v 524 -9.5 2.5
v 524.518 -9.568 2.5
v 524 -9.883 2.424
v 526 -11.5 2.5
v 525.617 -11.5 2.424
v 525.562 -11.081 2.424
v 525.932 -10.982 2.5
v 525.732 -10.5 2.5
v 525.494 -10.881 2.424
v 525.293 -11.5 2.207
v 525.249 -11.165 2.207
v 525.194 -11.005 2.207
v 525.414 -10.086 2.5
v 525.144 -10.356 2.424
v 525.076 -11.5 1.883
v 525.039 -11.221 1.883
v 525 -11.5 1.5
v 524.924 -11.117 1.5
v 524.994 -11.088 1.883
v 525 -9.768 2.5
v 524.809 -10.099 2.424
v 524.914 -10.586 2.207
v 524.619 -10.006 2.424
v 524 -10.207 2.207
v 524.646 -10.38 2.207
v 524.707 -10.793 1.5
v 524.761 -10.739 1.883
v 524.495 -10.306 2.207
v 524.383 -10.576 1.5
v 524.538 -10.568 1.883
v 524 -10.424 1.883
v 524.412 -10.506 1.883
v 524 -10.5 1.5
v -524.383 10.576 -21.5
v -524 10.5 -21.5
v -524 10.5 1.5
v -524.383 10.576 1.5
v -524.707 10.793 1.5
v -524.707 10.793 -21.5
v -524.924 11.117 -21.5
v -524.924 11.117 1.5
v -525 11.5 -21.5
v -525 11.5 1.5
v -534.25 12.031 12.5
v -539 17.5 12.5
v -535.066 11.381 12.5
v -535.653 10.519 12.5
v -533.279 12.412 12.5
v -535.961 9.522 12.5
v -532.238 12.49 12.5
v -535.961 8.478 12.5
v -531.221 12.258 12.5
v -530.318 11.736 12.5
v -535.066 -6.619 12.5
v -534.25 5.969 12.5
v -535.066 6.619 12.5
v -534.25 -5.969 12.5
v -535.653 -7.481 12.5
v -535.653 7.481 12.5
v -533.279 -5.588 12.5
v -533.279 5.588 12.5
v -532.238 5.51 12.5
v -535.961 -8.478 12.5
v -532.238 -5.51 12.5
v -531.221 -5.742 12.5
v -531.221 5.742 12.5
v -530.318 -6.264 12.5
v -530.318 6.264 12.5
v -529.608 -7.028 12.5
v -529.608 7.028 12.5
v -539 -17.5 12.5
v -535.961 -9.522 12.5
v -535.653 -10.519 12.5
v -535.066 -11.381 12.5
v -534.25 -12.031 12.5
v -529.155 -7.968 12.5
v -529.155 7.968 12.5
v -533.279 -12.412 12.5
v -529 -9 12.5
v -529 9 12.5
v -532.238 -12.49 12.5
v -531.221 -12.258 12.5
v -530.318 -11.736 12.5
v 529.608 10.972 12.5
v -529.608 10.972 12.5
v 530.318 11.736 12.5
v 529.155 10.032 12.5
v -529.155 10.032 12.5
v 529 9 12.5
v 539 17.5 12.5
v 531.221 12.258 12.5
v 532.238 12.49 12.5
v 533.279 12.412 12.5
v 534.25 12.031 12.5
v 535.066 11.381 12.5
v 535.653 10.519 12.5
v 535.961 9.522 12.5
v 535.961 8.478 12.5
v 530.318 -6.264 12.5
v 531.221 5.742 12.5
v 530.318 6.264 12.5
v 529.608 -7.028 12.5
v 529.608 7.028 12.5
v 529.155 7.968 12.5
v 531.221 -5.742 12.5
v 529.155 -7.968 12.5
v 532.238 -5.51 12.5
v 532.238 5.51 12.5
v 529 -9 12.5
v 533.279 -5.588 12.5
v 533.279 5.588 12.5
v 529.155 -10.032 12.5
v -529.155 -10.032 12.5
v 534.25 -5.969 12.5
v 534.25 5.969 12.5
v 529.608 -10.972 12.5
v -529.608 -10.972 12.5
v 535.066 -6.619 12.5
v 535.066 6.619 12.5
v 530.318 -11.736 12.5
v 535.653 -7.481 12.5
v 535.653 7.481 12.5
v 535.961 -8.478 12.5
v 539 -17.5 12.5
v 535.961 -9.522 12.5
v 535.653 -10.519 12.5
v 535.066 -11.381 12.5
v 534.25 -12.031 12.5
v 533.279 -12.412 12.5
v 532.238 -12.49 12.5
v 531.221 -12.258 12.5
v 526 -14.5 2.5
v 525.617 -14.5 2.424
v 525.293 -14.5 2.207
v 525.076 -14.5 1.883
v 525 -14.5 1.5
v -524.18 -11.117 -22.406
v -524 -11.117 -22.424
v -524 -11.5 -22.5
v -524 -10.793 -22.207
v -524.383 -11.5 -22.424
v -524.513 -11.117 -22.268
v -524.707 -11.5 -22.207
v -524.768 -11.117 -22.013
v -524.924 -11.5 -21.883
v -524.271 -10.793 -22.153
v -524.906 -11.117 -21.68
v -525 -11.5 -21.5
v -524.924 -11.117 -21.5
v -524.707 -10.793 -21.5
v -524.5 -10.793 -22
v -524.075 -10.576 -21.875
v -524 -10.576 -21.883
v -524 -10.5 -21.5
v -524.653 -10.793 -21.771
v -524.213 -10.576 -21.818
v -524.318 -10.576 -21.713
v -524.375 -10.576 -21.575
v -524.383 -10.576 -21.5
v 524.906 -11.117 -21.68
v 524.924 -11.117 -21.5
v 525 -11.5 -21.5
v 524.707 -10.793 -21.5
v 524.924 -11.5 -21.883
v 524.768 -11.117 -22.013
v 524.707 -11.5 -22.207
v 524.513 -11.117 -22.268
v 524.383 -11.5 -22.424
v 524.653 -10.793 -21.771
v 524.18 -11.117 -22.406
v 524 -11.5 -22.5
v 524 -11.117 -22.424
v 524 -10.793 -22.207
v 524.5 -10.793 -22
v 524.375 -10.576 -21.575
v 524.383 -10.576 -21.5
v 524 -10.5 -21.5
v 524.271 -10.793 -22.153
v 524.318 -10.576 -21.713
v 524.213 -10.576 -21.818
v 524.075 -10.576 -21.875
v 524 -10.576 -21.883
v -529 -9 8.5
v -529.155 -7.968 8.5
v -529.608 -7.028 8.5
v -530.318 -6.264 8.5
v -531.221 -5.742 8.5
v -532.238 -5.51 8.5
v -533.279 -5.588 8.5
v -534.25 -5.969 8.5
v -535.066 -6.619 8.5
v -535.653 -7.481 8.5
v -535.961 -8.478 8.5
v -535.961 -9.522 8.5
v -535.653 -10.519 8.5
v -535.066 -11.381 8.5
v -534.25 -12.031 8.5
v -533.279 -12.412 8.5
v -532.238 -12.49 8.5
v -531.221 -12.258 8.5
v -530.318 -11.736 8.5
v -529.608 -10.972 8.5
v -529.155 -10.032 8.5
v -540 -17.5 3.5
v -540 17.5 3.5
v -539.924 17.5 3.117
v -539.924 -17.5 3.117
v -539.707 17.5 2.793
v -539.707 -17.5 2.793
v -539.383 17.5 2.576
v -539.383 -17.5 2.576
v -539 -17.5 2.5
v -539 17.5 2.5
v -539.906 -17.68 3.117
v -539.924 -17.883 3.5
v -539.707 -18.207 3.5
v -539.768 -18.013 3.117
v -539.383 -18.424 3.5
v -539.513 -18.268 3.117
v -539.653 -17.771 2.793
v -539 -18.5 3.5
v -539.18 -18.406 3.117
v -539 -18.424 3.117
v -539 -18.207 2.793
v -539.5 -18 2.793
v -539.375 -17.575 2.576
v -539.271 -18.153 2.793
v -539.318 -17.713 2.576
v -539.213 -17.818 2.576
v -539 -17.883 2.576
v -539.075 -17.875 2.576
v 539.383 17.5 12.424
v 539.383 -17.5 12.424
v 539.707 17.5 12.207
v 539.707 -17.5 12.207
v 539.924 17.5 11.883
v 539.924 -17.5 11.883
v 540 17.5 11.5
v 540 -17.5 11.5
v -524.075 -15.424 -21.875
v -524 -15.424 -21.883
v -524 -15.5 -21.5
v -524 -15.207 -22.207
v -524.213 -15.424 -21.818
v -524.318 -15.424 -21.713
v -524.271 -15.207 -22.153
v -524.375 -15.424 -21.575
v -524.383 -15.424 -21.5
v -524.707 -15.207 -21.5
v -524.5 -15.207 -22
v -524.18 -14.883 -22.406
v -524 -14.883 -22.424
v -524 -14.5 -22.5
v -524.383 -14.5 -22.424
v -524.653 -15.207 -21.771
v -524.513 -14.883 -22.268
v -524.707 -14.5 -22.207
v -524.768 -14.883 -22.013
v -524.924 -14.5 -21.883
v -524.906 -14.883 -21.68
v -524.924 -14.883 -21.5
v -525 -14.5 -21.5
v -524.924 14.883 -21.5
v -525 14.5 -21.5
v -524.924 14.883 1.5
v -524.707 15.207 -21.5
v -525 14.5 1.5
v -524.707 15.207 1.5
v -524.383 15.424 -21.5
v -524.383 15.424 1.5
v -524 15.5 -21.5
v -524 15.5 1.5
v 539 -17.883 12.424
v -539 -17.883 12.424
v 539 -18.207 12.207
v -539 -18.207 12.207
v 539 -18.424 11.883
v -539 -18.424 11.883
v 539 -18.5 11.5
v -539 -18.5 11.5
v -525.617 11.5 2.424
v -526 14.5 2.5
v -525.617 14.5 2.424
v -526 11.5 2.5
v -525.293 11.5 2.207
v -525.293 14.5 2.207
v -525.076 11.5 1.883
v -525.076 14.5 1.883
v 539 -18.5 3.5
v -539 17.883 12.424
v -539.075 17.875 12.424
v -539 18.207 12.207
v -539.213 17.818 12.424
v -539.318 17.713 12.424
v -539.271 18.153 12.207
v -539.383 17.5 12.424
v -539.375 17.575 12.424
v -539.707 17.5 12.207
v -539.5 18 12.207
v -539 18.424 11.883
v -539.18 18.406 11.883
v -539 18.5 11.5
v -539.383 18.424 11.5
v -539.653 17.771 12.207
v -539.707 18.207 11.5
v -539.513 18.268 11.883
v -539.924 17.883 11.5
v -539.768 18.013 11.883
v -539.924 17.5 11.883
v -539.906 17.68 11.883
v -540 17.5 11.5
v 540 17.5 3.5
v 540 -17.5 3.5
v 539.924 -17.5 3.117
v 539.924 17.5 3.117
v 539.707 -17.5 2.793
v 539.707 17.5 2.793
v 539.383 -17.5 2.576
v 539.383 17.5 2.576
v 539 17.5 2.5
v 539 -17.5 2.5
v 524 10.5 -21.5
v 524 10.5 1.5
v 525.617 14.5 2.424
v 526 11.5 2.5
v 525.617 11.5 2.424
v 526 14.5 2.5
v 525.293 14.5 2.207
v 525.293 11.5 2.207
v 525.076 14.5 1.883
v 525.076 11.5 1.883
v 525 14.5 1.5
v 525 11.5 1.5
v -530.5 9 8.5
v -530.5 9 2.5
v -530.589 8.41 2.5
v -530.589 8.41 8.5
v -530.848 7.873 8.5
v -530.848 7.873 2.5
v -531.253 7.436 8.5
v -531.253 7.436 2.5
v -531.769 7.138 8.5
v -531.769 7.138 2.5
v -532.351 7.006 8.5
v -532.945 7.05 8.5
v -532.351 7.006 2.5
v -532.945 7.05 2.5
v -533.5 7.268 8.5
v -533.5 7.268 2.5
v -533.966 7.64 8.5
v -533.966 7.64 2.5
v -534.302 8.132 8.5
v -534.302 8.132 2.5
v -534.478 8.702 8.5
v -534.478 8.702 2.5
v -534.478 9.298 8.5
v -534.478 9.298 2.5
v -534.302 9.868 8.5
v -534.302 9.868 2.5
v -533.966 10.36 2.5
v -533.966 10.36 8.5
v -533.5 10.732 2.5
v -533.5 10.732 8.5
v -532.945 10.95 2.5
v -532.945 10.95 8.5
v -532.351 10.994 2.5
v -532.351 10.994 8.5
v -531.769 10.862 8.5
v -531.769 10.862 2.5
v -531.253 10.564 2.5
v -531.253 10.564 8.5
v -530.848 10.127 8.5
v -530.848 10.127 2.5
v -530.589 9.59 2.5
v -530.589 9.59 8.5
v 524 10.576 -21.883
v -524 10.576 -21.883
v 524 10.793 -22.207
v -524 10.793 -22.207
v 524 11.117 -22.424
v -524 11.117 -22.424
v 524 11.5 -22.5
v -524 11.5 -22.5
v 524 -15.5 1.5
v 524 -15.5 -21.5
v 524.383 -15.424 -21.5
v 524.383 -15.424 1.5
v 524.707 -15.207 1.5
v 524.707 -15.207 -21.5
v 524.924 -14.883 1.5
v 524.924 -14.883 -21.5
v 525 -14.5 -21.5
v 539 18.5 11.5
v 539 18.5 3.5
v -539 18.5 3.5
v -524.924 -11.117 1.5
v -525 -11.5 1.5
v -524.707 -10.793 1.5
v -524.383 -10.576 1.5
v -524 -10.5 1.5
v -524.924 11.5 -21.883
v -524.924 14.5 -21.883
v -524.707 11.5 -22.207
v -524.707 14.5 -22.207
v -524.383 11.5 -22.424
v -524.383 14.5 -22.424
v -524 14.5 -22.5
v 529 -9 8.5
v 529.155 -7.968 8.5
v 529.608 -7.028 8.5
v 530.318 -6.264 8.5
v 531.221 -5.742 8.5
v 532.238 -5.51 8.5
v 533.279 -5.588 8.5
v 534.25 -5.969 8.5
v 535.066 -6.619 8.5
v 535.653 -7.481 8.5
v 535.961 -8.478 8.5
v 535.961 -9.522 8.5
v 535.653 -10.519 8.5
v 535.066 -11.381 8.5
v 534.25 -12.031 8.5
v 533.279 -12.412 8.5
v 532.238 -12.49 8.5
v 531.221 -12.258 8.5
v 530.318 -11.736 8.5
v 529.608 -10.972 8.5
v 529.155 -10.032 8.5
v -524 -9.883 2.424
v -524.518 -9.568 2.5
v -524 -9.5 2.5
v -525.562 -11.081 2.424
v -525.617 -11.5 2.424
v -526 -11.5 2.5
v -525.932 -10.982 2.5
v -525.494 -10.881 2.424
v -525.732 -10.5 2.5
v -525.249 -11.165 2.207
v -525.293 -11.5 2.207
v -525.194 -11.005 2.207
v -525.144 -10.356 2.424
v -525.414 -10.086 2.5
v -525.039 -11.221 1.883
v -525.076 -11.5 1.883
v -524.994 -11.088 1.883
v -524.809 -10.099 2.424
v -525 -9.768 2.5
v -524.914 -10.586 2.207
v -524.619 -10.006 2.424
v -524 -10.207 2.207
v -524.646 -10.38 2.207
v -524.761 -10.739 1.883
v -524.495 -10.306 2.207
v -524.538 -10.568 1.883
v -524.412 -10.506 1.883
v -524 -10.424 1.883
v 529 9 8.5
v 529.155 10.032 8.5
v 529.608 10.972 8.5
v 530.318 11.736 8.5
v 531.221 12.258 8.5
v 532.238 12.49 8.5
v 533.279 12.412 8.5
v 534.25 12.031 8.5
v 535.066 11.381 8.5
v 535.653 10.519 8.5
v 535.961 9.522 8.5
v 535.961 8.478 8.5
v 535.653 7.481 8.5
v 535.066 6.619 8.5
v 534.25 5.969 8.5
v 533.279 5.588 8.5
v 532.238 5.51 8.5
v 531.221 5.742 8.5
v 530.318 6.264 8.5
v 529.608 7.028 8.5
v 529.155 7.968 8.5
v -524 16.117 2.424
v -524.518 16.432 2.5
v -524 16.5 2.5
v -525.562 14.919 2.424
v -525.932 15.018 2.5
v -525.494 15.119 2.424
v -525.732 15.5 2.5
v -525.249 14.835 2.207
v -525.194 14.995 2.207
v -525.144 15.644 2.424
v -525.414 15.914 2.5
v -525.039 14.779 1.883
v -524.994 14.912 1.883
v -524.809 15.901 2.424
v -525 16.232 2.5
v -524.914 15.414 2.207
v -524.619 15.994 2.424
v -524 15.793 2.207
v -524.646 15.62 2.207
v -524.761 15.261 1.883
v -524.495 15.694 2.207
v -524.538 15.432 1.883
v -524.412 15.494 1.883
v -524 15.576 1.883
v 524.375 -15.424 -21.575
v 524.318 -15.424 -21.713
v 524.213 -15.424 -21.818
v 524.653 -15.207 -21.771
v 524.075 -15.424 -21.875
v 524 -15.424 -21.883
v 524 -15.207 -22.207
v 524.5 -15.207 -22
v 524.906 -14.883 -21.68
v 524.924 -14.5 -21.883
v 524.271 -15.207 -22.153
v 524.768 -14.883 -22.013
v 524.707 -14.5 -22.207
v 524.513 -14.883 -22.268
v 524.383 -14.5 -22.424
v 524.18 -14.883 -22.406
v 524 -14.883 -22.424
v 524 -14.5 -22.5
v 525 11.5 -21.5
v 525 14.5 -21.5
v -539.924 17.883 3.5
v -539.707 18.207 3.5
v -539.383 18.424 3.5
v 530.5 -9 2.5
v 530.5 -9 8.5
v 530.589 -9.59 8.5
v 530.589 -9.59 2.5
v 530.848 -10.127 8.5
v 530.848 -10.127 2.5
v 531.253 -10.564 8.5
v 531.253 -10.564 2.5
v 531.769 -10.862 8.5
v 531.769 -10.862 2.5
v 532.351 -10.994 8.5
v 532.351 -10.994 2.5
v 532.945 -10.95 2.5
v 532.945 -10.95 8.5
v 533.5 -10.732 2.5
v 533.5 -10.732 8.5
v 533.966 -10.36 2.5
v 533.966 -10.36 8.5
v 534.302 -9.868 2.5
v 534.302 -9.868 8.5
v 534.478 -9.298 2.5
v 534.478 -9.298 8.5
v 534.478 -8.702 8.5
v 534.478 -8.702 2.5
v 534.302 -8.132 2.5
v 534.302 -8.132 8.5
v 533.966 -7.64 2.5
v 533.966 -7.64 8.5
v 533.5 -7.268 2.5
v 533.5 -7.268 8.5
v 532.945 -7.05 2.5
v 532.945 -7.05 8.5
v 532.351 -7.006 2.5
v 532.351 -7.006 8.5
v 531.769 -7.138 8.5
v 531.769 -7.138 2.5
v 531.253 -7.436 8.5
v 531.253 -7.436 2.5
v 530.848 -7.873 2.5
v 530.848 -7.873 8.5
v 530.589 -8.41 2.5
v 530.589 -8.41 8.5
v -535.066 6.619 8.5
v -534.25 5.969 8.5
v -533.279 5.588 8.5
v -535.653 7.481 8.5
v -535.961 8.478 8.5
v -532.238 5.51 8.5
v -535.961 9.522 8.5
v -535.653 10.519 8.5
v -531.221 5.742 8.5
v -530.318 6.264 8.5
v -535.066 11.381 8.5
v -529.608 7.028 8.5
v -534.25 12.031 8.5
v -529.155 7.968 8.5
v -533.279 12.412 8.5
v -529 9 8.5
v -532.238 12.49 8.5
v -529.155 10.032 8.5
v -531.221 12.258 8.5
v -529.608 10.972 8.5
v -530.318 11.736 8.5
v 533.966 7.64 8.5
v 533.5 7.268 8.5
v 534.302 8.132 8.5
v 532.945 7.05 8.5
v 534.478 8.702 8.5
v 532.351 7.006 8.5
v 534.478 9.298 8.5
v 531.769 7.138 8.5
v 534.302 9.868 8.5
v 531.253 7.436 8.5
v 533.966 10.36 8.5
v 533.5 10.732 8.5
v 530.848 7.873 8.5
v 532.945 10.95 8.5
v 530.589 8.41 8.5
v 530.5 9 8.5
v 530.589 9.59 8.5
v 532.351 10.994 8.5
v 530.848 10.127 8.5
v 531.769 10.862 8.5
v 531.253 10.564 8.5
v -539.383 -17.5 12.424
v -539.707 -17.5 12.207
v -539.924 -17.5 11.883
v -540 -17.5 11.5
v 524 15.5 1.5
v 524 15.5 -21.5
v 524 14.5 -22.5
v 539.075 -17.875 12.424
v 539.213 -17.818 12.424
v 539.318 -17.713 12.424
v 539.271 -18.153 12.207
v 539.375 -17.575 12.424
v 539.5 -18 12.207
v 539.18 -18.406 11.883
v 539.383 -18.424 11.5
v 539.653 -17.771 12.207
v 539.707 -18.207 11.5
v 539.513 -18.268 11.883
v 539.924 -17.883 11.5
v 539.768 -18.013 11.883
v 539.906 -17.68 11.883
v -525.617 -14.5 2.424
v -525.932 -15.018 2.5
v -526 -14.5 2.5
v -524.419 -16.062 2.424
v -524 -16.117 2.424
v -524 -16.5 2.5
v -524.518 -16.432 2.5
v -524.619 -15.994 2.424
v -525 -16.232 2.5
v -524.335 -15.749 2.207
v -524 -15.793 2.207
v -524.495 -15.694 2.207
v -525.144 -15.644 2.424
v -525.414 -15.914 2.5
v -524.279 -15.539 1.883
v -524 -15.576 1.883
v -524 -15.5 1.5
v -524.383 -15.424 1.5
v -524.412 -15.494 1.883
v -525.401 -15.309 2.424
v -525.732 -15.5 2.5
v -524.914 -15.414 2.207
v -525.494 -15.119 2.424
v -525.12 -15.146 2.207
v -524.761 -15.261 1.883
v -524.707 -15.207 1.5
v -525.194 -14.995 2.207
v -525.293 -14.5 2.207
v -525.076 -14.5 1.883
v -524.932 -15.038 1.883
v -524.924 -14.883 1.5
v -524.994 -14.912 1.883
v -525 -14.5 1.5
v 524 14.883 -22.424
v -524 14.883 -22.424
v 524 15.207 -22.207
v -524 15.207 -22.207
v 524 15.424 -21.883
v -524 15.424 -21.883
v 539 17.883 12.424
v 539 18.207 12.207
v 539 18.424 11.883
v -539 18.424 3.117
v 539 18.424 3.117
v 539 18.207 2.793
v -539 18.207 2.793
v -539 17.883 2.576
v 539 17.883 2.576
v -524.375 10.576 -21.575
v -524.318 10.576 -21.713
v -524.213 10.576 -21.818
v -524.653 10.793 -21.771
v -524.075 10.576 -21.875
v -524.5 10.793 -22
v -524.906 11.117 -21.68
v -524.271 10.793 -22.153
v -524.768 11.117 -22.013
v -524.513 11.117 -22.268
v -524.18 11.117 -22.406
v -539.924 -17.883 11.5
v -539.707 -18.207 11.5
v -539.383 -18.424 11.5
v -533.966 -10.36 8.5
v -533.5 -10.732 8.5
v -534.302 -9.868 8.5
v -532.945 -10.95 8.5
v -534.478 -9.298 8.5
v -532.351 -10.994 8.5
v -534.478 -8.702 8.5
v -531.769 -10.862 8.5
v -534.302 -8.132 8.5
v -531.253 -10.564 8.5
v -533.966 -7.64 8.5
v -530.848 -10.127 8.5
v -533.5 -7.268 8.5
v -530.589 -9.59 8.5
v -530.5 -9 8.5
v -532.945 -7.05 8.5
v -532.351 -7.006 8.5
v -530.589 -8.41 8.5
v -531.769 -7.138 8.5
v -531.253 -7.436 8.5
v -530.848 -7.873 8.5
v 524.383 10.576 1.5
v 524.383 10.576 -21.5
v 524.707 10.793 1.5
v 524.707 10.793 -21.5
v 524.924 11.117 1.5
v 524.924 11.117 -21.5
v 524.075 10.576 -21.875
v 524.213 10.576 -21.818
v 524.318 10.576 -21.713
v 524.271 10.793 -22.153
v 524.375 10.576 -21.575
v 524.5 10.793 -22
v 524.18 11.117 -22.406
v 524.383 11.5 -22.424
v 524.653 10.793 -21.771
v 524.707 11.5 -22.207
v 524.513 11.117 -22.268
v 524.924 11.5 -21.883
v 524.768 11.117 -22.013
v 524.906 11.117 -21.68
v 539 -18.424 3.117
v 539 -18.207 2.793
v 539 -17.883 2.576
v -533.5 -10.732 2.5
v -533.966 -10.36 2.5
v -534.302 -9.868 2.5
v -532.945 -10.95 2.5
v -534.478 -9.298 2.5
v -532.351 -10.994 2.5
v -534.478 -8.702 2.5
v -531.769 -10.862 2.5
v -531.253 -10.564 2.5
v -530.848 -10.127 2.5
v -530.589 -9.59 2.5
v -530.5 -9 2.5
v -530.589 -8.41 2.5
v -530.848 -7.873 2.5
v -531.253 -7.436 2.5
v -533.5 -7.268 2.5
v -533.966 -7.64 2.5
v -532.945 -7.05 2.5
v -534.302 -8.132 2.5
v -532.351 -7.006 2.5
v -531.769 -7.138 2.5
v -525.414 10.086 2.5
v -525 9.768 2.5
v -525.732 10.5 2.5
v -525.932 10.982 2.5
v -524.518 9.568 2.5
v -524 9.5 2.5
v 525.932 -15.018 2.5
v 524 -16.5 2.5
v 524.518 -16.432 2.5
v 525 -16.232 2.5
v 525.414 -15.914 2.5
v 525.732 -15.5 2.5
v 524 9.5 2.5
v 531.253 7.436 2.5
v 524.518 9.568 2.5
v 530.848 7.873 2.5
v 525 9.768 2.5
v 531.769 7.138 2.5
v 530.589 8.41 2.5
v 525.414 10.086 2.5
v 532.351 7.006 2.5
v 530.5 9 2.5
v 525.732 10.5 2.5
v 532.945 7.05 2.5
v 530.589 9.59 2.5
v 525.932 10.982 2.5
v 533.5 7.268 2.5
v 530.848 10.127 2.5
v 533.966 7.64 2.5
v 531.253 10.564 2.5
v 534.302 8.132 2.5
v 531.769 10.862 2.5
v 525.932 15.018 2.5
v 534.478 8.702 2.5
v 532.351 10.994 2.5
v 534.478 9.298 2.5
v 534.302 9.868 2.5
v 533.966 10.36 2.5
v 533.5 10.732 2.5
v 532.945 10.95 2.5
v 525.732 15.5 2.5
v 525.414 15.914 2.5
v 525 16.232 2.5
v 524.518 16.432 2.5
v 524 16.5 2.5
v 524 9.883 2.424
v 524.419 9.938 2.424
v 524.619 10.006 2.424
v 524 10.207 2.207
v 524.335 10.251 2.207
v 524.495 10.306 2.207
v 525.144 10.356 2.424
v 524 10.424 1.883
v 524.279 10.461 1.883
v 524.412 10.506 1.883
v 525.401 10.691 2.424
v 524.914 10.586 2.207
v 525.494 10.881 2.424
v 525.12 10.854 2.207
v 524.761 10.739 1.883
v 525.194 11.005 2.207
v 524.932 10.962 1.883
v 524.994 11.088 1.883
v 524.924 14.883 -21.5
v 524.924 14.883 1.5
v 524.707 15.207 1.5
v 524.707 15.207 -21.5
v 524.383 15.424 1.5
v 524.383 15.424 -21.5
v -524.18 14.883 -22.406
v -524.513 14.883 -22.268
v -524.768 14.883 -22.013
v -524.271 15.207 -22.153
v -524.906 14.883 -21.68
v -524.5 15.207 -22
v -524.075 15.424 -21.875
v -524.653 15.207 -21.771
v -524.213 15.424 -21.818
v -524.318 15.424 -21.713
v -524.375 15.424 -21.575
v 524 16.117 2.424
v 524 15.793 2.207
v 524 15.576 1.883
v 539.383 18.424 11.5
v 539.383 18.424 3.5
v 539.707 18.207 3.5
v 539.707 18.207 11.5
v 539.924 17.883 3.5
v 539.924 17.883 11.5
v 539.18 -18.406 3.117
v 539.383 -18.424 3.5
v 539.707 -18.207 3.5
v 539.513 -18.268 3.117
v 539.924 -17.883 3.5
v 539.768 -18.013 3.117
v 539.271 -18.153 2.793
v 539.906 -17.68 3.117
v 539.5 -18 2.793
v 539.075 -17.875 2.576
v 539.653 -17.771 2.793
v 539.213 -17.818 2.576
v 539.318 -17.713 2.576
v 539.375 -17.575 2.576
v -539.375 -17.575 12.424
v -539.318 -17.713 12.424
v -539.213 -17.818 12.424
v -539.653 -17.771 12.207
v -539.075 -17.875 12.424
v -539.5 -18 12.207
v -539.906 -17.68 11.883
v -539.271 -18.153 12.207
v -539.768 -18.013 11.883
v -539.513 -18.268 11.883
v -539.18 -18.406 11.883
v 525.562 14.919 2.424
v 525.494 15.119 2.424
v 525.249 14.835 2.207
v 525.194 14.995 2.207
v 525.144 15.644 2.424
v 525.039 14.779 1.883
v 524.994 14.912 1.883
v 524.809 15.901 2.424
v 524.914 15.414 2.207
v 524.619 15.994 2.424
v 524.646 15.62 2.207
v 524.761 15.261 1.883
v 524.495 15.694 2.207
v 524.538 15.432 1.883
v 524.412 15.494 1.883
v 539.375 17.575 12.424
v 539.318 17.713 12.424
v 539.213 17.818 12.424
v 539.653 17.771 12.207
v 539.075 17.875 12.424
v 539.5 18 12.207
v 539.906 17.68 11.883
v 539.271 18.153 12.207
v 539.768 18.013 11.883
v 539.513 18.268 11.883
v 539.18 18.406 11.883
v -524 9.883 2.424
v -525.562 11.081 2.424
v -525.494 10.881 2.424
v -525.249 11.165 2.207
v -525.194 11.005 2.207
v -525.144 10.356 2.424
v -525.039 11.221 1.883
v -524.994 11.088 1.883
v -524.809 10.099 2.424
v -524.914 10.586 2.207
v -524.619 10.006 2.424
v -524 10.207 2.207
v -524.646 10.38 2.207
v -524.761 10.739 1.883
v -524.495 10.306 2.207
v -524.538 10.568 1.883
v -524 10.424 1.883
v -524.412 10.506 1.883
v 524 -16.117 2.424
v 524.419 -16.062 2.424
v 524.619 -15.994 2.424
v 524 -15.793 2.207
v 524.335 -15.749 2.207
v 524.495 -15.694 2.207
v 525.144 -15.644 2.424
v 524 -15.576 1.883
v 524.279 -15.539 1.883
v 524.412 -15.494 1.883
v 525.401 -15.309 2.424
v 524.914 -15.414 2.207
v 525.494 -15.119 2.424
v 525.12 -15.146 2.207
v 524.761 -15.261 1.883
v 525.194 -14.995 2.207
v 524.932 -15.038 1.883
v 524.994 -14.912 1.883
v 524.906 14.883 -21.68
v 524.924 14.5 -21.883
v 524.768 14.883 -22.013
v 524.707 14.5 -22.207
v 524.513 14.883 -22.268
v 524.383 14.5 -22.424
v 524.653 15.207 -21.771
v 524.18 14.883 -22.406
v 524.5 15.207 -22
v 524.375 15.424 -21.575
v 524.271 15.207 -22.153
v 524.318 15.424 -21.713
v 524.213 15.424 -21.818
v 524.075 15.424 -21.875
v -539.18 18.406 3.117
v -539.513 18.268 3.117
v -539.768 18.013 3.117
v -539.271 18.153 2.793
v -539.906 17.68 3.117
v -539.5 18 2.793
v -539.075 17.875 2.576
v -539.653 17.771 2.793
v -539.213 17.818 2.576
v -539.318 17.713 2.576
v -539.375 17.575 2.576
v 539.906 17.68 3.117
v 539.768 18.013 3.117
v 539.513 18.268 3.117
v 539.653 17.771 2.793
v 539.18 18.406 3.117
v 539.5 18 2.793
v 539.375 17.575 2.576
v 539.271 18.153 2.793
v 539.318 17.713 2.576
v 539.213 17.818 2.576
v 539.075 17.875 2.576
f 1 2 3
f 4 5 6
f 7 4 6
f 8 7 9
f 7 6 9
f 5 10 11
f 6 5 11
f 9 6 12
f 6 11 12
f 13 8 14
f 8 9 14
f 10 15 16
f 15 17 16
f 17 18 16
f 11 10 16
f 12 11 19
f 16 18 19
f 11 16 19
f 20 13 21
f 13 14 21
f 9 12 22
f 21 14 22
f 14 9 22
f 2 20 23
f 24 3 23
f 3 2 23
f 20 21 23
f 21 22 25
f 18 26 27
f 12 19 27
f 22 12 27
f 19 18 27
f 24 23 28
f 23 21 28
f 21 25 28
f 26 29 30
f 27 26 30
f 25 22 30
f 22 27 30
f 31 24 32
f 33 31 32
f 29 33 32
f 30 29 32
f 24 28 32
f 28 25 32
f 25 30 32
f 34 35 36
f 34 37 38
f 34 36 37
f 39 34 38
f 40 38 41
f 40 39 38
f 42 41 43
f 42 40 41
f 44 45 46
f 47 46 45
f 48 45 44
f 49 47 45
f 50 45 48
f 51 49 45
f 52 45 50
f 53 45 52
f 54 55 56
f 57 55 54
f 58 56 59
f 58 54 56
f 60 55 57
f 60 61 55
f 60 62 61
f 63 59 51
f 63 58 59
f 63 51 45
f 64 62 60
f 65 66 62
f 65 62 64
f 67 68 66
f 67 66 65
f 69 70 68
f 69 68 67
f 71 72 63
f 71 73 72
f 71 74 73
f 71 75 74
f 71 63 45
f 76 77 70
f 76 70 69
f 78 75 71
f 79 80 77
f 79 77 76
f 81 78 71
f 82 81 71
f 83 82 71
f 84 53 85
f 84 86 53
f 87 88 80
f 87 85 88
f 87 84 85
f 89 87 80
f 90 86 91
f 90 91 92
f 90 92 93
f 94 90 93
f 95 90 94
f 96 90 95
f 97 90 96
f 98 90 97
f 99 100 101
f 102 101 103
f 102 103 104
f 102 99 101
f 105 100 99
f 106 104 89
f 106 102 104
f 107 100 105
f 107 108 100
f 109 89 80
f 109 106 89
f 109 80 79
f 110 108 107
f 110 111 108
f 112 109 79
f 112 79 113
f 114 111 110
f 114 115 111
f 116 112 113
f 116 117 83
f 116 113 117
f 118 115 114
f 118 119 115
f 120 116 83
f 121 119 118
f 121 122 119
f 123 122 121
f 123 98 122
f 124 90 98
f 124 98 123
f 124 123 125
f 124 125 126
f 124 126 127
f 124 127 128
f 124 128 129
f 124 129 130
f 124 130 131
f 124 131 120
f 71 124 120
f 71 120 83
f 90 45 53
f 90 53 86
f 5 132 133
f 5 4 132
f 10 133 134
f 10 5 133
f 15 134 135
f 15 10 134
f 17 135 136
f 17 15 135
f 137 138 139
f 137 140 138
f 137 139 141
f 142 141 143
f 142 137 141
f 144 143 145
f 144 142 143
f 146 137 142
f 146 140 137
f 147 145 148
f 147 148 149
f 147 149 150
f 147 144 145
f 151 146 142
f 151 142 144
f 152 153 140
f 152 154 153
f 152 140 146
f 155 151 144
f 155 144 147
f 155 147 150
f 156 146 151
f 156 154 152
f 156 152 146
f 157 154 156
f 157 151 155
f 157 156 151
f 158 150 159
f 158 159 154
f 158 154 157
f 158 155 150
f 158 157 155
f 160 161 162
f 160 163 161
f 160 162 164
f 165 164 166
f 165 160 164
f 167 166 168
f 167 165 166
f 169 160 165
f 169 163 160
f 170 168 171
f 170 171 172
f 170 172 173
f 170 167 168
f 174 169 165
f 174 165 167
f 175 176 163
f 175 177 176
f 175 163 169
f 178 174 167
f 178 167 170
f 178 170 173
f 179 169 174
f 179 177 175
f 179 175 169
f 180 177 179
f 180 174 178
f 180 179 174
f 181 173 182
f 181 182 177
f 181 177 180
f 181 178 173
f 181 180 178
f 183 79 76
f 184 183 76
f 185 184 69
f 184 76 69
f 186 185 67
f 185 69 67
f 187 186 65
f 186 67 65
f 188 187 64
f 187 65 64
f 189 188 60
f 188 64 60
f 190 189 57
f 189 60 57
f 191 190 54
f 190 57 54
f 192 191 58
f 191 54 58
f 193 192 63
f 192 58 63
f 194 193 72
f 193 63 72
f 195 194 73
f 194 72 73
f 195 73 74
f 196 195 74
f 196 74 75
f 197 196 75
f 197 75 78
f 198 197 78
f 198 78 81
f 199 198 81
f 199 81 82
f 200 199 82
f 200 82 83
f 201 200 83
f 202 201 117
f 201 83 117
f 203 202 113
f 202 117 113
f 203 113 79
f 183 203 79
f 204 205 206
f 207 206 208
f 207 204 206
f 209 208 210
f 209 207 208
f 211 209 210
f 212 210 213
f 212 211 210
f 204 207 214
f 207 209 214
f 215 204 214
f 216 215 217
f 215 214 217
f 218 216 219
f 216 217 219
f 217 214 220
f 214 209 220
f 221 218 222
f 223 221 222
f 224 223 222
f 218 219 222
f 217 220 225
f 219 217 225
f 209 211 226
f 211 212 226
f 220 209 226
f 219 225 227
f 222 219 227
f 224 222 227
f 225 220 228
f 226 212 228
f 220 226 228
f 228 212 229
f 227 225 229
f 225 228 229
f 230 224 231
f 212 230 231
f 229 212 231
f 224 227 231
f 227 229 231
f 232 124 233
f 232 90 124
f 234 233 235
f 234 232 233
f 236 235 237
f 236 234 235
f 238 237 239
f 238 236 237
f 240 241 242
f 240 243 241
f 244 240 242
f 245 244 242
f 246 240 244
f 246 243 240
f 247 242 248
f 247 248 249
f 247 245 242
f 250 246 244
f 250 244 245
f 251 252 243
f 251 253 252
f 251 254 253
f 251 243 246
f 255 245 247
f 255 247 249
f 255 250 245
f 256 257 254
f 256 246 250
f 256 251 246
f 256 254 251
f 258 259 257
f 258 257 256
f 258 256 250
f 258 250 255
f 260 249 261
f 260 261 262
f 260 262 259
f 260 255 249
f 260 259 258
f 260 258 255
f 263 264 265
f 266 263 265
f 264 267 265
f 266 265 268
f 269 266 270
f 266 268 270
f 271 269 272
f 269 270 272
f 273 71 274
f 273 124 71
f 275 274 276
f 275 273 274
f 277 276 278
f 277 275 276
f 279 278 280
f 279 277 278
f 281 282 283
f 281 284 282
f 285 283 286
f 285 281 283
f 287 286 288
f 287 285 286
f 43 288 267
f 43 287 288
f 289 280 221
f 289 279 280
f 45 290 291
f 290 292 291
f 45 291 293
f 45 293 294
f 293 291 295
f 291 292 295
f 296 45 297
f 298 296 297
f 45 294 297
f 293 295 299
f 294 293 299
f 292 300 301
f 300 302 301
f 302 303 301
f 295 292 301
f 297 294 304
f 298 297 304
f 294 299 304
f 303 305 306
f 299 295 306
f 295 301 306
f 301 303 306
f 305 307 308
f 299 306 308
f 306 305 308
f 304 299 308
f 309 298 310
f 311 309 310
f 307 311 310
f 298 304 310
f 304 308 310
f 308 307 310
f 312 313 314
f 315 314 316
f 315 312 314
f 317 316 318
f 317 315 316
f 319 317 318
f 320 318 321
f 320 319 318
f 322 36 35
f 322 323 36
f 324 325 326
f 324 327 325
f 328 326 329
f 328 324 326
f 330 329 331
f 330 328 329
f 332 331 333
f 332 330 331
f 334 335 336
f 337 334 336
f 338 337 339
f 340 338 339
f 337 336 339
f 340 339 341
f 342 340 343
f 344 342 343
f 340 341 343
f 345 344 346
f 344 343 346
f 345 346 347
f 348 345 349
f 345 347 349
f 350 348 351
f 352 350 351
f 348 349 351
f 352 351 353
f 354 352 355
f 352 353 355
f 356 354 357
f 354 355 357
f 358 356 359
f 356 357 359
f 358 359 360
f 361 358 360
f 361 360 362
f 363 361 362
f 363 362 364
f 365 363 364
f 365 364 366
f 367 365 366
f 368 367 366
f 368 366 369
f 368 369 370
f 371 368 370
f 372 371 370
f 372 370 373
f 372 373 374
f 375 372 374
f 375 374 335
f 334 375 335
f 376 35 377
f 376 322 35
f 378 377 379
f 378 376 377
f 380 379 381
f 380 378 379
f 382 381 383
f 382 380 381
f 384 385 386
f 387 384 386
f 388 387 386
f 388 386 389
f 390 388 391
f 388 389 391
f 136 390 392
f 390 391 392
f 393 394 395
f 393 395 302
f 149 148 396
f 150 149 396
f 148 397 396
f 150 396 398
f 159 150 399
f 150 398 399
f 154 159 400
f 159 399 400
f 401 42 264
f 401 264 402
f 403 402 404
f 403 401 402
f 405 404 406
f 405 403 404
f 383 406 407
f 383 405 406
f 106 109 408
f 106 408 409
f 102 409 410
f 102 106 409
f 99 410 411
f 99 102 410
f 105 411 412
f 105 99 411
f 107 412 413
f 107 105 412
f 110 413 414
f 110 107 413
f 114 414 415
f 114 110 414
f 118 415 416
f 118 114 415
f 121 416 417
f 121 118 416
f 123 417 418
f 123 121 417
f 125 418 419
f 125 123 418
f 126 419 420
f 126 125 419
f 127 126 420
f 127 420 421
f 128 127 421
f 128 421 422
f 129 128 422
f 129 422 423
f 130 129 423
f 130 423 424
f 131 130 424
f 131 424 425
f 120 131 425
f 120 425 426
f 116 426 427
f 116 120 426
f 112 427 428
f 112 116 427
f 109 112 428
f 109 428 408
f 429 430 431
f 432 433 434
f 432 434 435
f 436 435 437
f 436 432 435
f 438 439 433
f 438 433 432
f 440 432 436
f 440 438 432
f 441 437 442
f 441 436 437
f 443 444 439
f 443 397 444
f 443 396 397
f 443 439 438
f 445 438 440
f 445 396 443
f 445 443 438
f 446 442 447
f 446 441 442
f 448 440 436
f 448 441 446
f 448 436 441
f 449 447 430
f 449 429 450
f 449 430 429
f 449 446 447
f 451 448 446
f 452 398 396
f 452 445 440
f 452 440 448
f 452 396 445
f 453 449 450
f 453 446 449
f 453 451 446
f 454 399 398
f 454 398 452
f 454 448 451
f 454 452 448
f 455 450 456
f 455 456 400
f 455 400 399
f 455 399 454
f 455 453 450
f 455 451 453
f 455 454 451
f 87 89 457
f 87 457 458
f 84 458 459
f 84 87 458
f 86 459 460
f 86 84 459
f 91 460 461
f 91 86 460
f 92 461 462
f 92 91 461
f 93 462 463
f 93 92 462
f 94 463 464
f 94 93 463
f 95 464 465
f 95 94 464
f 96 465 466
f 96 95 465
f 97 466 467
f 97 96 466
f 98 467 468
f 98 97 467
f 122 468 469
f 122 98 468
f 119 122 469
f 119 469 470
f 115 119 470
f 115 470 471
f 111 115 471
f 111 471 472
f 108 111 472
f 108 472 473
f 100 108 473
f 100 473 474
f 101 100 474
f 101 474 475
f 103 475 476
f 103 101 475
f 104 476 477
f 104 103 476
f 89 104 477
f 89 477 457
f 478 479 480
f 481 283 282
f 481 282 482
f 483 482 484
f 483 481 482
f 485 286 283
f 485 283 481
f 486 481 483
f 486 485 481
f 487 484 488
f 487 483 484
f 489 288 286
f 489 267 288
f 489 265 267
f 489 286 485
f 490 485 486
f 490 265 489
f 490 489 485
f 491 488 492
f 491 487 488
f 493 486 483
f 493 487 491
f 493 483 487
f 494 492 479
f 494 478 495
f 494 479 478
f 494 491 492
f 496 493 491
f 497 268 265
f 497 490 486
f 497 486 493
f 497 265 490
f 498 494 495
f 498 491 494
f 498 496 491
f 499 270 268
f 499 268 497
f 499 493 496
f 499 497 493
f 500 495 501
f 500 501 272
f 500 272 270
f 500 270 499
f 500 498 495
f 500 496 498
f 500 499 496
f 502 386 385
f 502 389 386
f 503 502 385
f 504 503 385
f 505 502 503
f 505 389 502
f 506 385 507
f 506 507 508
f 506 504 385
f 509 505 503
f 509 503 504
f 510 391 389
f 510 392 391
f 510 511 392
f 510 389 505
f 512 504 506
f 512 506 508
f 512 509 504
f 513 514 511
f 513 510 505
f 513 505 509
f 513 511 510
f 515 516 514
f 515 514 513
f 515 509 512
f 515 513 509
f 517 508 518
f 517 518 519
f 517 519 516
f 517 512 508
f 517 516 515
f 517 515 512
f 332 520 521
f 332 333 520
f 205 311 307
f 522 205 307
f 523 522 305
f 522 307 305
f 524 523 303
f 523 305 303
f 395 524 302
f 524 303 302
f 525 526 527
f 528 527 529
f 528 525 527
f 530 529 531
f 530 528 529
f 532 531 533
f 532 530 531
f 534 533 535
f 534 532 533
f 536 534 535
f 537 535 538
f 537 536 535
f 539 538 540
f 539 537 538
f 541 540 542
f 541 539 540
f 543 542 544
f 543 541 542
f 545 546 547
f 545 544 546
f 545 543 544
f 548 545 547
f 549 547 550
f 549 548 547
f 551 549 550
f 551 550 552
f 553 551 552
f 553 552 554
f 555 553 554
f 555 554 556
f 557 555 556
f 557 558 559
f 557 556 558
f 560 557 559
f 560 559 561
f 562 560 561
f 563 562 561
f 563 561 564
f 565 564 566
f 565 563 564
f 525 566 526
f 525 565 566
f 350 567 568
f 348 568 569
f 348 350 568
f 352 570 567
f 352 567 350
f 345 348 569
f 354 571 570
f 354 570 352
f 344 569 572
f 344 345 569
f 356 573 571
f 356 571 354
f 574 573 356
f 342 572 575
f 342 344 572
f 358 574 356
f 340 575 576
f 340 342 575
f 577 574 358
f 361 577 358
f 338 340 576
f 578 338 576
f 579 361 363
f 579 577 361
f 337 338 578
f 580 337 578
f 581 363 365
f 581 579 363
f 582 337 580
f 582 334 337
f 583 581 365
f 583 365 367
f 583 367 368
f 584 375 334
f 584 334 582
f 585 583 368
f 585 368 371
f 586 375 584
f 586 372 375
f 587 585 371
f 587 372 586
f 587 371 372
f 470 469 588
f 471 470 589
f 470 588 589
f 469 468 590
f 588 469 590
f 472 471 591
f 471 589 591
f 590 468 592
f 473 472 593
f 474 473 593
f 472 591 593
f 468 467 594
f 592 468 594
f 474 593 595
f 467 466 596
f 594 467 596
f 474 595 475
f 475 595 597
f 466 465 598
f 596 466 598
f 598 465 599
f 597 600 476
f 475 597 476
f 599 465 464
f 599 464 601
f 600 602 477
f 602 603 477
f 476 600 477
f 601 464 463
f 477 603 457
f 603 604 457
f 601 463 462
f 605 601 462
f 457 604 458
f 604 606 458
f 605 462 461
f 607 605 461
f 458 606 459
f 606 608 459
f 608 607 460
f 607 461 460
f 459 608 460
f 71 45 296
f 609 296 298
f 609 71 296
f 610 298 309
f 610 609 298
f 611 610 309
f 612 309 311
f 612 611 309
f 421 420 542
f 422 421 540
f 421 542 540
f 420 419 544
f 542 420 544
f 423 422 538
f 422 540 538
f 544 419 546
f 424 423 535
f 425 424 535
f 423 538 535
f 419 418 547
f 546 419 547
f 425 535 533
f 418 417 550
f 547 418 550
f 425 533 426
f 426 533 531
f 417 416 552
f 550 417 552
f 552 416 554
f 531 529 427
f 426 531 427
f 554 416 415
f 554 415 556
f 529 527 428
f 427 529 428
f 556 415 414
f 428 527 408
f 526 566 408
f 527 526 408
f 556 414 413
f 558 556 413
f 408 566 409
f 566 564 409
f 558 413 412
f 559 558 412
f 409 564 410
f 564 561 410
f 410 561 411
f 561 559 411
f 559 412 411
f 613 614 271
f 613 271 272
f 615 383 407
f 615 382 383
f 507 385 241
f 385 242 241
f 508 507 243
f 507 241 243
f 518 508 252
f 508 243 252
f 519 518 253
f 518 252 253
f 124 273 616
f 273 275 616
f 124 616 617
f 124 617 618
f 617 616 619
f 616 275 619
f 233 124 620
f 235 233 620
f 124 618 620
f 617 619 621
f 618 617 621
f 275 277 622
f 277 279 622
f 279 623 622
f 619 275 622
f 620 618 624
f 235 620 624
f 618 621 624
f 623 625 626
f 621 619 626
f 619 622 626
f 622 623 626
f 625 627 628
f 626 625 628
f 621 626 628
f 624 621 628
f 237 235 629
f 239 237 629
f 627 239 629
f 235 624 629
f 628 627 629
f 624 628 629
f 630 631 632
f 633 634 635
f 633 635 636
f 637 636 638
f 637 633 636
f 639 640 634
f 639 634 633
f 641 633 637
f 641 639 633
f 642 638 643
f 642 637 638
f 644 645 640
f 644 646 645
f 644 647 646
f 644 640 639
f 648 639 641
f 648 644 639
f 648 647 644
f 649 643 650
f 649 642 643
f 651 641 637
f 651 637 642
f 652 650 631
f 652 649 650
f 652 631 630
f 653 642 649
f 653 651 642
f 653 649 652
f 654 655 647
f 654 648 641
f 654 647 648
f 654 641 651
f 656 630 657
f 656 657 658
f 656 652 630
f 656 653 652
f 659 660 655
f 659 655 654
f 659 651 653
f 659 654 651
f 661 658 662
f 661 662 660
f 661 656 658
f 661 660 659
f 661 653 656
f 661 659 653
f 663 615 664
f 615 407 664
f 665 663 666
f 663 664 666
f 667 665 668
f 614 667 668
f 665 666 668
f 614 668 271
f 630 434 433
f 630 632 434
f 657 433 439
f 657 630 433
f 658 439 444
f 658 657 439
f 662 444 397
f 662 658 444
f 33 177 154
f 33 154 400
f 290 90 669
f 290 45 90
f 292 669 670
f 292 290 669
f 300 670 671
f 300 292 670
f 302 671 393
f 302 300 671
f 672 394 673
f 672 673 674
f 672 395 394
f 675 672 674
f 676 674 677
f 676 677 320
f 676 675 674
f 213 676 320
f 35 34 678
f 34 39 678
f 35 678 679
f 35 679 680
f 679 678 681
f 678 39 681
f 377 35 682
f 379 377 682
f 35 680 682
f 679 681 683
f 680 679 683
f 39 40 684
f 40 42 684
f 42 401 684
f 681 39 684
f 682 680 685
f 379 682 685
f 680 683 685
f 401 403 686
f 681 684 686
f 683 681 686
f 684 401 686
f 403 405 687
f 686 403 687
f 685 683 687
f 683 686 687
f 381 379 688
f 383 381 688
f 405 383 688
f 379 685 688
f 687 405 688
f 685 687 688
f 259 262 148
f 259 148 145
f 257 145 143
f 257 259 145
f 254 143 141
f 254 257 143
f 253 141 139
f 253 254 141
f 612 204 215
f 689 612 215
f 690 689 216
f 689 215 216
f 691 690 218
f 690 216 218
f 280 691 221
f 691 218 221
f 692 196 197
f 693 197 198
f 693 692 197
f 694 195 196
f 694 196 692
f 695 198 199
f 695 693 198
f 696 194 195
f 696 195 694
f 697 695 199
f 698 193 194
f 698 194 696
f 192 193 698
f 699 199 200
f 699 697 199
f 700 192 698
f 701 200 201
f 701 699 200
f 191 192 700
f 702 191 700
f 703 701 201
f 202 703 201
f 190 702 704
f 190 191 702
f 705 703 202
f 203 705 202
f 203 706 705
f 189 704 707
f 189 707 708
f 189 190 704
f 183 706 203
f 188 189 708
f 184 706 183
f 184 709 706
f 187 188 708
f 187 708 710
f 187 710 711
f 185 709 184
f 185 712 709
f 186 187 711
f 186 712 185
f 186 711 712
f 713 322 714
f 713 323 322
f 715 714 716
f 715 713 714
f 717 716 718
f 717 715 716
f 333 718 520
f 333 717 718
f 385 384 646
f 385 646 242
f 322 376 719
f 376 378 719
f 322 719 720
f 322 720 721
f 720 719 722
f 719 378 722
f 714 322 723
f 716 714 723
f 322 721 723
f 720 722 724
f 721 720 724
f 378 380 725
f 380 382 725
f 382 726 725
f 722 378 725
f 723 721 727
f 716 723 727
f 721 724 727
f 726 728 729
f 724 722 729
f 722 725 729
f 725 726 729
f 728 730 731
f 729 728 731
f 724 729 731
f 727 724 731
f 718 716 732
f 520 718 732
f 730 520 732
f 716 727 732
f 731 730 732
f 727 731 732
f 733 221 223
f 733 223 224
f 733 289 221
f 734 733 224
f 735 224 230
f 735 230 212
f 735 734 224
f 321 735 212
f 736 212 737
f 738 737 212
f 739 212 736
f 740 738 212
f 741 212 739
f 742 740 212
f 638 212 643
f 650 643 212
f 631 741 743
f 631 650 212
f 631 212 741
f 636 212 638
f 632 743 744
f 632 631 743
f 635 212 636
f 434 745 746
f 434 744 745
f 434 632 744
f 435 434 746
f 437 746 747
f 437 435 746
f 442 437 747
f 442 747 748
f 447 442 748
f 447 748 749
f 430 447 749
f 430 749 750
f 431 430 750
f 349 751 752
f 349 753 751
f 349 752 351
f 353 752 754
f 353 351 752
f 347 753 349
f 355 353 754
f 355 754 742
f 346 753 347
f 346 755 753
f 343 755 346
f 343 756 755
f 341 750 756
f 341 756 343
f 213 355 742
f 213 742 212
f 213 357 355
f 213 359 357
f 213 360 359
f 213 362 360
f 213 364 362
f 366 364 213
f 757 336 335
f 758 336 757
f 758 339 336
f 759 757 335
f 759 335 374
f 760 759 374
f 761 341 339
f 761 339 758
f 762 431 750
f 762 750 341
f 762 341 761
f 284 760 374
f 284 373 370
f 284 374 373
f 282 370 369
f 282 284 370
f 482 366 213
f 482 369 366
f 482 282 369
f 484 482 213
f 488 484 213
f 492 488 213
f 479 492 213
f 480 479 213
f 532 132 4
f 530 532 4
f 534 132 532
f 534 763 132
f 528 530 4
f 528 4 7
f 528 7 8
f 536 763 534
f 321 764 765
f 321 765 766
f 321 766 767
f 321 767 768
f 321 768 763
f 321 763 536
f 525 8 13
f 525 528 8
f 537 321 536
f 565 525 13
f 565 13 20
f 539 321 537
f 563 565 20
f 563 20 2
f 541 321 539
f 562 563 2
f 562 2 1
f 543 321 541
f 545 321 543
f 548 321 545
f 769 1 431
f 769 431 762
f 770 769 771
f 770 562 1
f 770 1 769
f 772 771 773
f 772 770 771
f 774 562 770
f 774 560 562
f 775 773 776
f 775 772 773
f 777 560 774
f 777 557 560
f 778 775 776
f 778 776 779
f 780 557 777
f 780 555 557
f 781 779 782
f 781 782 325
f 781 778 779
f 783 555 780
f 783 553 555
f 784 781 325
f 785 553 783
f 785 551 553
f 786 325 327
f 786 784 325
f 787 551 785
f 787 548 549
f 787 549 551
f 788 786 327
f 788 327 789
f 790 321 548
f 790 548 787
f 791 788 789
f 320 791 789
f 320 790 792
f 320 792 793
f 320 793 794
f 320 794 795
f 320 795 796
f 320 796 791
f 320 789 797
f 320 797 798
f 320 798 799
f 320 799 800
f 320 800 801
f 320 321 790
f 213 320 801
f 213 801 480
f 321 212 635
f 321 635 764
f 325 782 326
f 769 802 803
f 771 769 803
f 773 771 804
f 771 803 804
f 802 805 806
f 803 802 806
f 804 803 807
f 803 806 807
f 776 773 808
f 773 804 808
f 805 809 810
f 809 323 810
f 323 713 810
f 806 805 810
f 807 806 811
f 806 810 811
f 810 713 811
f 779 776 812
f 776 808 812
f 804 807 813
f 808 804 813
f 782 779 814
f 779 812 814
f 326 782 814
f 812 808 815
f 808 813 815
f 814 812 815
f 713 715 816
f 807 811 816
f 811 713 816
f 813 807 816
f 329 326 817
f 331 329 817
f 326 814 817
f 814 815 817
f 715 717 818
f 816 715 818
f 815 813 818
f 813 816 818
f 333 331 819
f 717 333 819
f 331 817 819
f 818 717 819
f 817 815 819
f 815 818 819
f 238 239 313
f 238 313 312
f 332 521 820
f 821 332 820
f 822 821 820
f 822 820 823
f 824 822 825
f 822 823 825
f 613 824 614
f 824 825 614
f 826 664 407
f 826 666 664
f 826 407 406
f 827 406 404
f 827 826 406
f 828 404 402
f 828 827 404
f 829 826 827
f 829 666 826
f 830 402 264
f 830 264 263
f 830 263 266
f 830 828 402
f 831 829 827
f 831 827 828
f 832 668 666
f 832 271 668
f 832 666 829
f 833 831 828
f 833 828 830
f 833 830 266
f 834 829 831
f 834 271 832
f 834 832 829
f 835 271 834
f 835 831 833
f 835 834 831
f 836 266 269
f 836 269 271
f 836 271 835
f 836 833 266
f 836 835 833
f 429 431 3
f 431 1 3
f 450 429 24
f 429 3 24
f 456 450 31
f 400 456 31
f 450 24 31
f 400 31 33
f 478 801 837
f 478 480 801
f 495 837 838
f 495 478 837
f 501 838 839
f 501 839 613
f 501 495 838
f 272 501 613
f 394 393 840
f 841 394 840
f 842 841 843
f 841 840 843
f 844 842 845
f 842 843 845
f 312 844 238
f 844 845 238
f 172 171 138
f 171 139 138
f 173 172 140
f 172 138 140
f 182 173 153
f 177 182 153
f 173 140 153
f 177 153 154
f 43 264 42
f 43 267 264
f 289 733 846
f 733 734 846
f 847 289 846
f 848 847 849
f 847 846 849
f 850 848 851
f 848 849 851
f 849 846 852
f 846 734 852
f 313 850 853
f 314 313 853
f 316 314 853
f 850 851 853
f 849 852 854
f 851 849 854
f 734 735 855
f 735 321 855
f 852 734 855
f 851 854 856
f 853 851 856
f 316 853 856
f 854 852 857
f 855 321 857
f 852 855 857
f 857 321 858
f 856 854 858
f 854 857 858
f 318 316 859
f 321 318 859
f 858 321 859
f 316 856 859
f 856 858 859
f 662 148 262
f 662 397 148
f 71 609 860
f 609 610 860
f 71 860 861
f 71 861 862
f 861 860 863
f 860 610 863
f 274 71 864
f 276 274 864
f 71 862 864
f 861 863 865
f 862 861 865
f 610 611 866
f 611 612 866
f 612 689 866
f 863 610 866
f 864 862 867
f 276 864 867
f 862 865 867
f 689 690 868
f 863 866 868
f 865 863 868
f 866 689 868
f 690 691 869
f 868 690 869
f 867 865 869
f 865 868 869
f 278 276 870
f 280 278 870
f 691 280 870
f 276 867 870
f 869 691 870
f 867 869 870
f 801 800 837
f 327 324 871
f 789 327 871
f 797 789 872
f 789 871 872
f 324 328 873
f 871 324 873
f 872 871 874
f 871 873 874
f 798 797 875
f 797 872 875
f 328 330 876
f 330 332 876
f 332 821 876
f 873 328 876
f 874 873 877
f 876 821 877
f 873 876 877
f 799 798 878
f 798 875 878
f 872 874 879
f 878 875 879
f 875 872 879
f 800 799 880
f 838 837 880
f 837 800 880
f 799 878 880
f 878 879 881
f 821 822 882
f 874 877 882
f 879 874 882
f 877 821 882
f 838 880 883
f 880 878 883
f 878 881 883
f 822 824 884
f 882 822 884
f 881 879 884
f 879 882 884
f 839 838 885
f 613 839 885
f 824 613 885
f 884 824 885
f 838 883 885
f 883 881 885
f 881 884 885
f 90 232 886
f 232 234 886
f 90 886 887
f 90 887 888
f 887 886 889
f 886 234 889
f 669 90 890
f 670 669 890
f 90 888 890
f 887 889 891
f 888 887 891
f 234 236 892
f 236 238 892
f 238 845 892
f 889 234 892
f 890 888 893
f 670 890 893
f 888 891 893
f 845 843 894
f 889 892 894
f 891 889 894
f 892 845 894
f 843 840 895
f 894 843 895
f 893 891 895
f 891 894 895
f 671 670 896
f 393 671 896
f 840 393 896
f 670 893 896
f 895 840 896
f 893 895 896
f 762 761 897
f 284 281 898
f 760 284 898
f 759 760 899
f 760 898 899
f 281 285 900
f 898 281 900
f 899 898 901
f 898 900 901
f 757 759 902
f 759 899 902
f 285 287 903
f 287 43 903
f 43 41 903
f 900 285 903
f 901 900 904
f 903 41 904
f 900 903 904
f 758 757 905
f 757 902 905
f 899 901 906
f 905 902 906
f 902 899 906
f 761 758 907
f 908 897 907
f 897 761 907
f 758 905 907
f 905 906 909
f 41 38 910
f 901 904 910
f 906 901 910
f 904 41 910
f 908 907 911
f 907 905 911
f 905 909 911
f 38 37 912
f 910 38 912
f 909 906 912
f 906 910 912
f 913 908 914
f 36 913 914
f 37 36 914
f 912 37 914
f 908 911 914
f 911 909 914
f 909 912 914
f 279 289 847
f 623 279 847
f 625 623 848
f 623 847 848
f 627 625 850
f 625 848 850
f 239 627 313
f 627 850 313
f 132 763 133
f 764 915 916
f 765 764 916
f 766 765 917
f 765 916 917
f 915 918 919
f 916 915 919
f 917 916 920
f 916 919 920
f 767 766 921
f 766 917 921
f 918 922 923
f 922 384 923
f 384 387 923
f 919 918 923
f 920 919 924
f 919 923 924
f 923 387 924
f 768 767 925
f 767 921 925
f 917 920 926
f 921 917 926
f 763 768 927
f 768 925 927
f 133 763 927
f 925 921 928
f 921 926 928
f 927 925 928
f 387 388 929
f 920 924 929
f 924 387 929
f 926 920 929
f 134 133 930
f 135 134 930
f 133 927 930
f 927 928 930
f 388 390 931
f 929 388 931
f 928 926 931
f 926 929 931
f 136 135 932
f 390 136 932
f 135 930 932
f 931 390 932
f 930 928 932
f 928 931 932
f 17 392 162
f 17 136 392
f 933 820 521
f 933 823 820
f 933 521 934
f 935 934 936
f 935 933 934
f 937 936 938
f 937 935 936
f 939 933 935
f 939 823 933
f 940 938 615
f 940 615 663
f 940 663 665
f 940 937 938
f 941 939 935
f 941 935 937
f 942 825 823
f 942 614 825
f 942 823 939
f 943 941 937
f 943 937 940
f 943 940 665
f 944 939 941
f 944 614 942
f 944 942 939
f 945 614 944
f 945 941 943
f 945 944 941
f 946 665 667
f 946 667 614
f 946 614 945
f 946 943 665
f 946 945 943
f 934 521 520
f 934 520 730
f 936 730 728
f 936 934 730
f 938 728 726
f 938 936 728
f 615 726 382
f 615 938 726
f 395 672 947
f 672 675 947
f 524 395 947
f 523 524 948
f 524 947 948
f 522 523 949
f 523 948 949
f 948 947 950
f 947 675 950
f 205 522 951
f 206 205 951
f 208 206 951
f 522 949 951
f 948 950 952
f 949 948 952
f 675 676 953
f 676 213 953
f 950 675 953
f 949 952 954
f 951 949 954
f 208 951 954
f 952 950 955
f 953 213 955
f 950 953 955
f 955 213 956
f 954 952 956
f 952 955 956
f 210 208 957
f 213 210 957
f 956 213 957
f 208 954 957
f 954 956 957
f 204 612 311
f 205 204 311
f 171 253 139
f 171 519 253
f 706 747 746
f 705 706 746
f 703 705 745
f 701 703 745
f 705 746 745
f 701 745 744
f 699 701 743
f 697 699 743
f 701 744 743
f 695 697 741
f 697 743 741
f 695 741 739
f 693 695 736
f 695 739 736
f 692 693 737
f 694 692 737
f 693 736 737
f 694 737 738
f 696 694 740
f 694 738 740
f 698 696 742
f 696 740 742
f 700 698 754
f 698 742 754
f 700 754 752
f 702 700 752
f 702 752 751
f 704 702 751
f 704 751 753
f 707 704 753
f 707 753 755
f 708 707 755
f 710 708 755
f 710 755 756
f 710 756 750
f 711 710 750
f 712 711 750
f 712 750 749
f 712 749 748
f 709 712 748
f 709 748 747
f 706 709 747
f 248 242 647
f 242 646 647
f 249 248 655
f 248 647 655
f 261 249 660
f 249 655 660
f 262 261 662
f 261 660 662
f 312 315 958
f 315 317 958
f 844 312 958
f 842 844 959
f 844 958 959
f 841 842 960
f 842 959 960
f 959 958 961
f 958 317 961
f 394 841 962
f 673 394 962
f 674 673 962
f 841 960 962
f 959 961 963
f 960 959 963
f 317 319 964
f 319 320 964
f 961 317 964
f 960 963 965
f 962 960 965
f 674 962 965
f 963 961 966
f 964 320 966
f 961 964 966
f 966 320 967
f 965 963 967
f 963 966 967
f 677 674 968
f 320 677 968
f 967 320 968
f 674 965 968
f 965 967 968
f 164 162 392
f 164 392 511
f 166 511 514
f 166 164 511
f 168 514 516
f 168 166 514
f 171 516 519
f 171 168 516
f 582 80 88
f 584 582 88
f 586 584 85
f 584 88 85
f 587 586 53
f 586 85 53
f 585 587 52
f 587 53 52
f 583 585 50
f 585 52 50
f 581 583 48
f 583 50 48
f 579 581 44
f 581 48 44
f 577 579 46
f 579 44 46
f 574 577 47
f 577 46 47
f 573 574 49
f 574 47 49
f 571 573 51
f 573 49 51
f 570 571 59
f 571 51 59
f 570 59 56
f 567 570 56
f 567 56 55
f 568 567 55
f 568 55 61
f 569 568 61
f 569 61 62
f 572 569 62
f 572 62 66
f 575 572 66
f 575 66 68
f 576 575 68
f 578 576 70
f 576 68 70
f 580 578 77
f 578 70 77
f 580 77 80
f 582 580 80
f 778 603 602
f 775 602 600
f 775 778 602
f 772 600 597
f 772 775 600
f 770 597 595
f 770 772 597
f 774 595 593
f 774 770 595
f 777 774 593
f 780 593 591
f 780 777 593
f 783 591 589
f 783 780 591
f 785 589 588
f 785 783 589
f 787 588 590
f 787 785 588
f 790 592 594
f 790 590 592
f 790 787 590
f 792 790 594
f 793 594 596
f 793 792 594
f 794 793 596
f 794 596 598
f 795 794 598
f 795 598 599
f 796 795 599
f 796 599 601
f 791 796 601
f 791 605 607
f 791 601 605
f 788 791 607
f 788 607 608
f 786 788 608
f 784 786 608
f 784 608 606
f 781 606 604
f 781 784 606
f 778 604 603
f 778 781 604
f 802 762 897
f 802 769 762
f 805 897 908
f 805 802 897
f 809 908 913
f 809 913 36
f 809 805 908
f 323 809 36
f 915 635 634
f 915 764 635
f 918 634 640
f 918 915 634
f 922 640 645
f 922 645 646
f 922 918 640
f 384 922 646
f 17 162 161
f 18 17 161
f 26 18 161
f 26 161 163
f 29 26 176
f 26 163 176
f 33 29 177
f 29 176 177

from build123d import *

# Parameters (mm, degrees)
F1_DEPTH = 540
F2_W     = 31
F2_H     = 25
F3_DEPTH = 15
F4_W     = 31
F4_H     = 25
F5_DEPTH = 15
F6_R     = 2
F7_DEPTH = 10.001
F8_R     = 3.5
F9_DEPTH = 4
F10_R    = 1
F11_R    = 1


# Not quite as in the source:
# - a pattern or mirror of a feature is missing from the dataset's text; its kind, count and spacing are read off the source's solid


with BuildPart() as f1:
    # F0 (on Right) → F1 (new body, symmetric)
    with BuildSketch(Plane.YZ):
        Polygon((18.5, 12.5), (-18.5, 12.5), (-18.5, 2.5), (-15.5, 2.5), (-15.5, -22.5), (-10.5, -22.5), (-10.5, 2.5), (0, 2.5), (10.5, 2.5), (10.5, -22.5), (15.5, -22.5), (15.5, 2.5), (18.5, 2.5), align=None)
    extrude(amount=F1_DEPTH, both=True)

    # F2 (on face) → F3 (cut)
    with BuildSketch(Plane(origin=(-540, 0, 0), x_dir=(0, -1, 0), z_dir=(-1, 0, 0))):
        with Locations((0, -10)):
            Rectangle(F2_W, F2_H)
    extrude(amount=-F3_DEPTH, mode=Mode.SUBTRACT)

    # F4 (on face) → F5 (cut)
    with BuildSketch(Plane.YZ.offset(540)):
        with Locations((0, -10)):
            Rectangle(F4_W, F4_H)
    extrude(amount=-F5_DEPTH, mode=Mode.SUBTRACT)

    # F6 (on face) → F7 (cut, through all)
    with BuildSketch(Plane(origin=(0, 0, 2.5), x_dir=(1, 0, 0), z_dir=(0, 0, -1))):
        with Locations((-532.5, 9)):
            Circle(F6_R)
        with Locations((-532.5, -9)):
            Circle(F6_R)
    f7 = extrude(amount=-F7_DEPTH, mode=Mode.SUBTRACT)

    # F7_copies: F7 across plane
    add(f7.mirror(Plane(origin=(0, 0, 0), x_dir=(0, 0, 1), z_dir=(1, 0, 0))), mode=Mode.SUBTRACT)

    # F8 (on face) → F9 (cut)
    with BuildSketch(Plane.XY.offset(12.5)):
        with Locations((-532.5, -9)):
            Circle(F8_R)
        with Locations((-532.5, 9)):
            Circle(F8_R)
    f9 = extrude(amount=-F9_DEPTH, mode=Mode.SUBTRACT)

    # F9_copies: F9 across plane
    add(f9.mirror(Plane(origin=(0, 0, 0), x_dir=(0, 0, 1), z_dir=(1, 0, 0))), mode=Mode.SUBTRACT)

    # F10
    f10_edges = [f1.edges().sort_by_distance(p)[0] for p in [
        (540, 18.5, 7.5),
        (540, -18.5, 7.5),
        (525, 13, -22.5),
        (525, -13, -22.5),
        (-540, -18.5, 7.5),
        (-525, -13, -22.5),
        (-525, 13, -22.5),
        (-540, 18.5, 7.5),
    ]]
    fillet(f10_edges, radius=F10_R)

    # F11
    f11_edges = [f1.edges().sort_by_distance(p)[0] for p in [
        (-525, -10.5, -9.5),
        (-525, -15.5, -9.5),
        (-525, 15.5, -9.5),
        (-525, 10.5, -9.5),
        (-525, 13, -21.5),
        (-525, 13, 2.5),
        (-540, 0, 2.5),
        (-540, 0, 12.5),
        (0, -15.5, 2.5),
        (-539.707107, 18.207107, 12.5),
        (-539.707107, -18.207107, 12.5),
        (0, 18.5, 12.5),
        (0, -18.5, 12.5),
        (539.707107, 18.207107, 12.5),
        (539.707107, -18.207107, 12.5),
        (540, 0, 12.5),
        (-539.707107, 18.207107, 2.5),
        (-539.707107, -18.207107, 2.5),
        (0, 18.5, 2.5),
        (0, -18.5, 2.5),
        (539.707107, 18.207107, 2.5),
        (539.707107, -18.207107, 2.5),
        (540, 0, 2.5),
        (-525, -13, 2.5),
        (525, -13, 2.5),
        (0, -10.5, 2.5),
        (0, 10.5, 2.5),
        (525, 13, 2.5),
        (0, 15.5, 2.5),
        (525, -15.5, -9.5),
        (524.707107, -15.5, -22.207107),
        (0, -15.5, -22.5),
        (-524.707107, -15.5, -22.207107),
        (525, -10.5, -9.5),
        (0, -10.5, -22.5),
        (-524.707107, -10.5, -22.207107),
        (524.707107, -10.5, -22.207107),
        (525, 10.5, -9.5),
        (524.707107, 10.5, -22.207107),
        (0, 10.5, -22.5),
        (-524.707107, 10.5, -22.207107),
        (525, 15.5, -9.5),
        (0, 15.5, -22.5),
        (-524.707107, 15.5, -22.207107),
        (524.707107, 15.5, -22.207107),
    ]]
    fillet(f11_edges, radius=F11_R)


solid = f1.part
